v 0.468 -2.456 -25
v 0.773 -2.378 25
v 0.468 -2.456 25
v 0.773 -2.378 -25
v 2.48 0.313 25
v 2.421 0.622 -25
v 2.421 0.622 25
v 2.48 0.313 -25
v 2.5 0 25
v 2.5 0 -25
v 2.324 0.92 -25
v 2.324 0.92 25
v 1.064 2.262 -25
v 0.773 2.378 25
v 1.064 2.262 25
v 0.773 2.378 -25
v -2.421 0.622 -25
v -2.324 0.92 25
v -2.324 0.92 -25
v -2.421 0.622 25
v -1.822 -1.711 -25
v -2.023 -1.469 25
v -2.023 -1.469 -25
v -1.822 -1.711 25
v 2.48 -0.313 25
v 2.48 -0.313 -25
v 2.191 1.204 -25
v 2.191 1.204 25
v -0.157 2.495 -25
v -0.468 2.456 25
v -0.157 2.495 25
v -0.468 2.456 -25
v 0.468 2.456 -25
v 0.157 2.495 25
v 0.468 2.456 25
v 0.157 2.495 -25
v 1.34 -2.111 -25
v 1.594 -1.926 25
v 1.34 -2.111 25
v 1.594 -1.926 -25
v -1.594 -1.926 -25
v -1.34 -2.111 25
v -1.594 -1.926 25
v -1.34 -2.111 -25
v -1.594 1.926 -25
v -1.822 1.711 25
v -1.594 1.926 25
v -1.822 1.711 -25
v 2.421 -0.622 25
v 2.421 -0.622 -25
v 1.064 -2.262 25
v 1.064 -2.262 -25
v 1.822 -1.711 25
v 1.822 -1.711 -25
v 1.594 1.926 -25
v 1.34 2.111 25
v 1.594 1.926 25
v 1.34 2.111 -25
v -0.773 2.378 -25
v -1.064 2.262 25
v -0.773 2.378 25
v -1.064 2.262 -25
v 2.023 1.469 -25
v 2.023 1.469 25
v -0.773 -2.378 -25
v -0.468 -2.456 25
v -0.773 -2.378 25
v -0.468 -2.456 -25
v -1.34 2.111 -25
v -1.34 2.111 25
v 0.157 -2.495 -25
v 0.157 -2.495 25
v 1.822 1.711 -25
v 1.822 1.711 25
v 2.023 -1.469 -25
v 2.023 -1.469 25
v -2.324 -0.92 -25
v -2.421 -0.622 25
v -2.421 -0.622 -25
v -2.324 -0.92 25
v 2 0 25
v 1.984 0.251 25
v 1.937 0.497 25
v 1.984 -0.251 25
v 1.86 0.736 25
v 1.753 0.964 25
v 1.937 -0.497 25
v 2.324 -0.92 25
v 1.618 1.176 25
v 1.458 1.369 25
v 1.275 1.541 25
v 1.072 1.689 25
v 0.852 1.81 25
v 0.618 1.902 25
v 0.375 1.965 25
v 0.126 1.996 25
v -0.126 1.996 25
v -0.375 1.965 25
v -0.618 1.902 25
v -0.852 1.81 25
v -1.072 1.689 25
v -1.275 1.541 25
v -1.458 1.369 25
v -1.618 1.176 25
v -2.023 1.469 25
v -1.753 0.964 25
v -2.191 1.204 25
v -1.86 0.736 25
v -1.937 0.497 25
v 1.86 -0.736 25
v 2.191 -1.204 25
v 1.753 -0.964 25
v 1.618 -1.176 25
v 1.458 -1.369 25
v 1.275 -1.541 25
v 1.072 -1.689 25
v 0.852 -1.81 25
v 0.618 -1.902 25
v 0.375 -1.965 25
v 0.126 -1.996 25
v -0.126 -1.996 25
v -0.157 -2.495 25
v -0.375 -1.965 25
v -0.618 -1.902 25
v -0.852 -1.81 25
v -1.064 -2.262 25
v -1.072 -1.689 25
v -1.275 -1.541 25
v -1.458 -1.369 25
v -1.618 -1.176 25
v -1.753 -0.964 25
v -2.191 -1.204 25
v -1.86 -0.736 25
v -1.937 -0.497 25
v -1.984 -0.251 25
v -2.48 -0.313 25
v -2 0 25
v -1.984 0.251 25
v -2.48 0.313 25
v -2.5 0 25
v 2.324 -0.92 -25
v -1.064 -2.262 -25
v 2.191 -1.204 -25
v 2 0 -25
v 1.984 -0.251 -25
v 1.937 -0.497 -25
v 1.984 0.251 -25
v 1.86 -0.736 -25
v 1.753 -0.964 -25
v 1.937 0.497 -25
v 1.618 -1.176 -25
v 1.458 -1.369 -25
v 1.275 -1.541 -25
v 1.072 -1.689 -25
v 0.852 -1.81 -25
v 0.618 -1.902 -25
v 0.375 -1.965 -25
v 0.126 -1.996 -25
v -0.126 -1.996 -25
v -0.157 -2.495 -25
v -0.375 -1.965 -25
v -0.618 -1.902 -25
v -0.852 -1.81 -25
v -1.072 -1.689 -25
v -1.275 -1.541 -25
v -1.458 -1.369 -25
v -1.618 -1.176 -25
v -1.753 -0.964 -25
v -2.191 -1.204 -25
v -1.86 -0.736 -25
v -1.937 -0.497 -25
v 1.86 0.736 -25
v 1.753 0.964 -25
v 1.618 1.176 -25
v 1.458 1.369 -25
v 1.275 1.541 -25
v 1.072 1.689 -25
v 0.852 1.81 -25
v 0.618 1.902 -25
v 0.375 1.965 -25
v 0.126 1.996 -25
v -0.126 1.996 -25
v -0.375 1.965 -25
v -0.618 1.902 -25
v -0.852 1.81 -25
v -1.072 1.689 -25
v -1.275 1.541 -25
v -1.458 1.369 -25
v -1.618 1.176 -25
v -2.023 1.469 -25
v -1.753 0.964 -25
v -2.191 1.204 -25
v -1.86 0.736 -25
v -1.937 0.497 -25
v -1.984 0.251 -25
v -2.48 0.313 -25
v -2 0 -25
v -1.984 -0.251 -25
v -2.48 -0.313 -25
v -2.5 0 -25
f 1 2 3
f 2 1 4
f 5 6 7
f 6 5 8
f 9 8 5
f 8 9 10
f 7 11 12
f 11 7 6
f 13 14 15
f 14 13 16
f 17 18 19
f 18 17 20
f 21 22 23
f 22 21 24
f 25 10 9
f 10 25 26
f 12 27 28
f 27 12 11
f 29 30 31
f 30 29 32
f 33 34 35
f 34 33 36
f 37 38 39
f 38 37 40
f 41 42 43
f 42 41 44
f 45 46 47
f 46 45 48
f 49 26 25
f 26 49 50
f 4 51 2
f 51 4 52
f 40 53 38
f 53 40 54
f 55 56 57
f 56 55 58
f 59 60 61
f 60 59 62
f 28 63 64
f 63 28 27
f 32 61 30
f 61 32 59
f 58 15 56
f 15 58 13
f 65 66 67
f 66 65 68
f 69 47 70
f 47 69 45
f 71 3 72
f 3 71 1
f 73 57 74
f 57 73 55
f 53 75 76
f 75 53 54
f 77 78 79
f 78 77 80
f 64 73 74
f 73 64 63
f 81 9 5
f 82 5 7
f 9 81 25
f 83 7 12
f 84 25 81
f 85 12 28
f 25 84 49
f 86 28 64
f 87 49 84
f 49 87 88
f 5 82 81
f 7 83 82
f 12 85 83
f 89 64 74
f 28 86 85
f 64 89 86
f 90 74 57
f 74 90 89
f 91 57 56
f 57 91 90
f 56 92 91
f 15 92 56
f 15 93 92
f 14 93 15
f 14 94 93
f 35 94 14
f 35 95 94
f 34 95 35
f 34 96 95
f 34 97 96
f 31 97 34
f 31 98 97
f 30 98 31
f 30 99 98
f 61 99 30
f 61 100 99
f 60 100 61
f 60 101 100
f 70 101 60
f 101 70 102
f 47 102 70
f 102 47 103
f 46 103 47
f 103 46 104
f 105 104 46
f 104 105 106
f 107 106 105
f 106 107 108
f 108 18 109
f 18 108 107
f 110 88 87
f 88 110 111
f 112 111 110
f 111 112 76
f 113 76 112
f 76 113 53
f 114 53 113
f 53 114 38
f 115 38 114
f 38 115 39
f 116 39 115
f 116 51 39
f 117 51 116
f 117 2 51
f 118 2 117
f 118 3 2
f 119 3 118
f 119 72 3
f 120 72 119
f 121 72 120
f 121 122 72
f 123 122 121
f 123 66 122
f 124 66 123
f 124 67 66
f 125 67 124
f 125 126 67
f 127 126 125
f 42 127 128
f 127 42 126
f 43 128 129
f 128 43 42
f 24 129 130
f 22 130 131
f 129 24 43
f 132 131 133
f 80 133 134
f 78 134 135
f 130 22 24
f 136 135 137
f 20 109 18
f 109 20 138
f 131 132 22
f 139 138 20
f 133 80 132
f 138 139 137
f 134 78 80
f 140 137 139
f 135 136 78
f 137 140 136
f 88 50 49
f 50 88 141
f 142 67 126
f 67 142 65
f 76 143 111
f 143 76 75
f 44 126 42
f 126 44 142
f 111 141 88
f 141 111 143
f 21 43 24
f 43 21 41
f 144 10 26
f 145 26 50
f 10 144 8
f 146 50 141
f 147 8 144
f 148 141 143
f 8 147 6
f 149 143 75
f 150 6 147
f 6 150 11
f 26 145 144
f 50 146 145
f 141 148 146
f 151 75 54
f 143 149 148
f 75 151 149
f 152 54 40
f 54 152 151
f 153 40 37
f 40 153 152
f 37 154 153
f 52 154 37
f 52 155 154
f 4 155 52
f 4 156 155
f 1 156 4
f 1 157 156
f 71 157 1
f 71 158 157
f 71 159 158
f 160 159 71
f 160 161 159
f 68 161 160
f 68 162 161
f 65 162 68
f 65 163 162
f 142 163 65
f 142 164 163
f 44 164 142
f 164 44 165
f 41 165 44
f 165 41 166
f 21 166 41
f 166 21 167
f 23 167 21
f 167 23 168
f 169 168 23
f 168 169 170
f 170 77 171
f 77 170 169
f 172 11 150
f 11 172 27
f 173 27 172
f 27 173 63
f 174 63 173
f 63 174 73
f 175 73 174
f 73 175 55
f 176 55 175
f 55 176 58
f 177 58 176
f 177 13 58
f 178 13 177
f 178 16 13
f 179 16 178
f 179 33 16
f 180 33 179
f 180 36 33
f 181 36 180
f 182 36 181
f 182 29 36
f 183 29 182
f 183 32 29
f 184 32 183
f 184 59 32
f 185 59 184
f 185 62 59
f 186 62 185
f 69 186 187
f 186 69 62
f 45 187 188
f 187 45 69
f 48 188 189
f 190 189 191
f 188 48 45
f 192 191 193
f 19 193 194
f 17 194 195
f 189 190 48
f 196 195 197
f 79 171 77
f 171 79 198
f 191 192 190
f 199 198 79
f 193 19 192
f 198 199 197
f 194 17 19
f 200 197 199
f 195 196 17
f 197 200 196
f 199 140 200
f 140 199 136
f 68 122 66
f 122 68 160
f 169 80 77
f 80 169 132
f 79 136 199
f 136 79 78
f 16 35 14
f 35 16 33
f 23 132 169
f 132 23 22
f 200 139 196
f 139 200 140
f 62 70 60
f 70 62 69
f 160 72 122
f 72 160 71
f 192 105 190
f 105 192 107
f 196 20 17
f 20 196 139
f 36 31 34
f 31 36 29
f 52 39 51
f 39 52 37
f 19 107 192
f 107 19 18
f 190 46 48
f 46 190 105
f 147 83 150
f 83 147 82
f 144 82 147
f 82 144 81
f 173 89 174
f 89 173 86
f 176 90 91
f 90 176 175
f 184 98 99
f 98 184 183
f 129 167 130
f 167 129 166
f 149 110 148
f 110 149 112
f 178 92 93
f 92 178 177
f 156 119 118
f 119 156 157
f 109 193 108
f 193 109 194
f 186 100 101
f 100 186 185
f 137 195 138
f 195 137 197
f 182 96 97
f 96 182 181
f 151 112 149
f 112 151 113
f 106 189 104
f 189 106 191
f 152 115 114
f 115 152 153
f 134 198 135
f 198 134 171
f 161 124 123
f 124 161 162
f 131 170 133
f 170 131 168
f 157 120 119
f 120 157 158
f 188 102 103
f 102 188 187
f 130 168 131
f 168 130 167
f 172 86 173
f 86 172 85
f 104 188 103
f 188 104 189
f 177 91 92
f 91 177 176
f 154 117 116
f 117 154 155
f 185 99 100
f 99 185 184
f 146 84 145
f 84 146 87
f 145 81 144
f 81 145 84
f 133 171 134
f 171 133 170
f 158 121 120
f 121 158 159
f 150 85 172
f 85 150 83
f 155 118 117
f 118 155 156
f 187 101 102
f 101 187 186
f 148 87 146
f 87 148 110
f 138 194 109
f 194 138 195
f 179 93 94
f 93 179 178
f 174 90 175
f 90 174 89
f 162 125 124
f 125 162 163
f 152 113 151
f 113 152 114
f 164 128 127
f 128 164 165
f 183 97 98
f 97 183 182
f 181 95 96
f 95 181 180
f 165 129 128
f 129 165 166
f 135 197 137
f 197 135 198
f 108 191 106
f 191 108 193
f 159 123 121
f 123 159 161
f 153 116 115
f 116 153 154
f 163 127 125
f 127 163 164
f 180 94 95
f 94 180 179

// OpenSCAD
$fn = 50;


difference() {
	union() {
		translate(v = [0, 0, -25.0000000000]) {
			cylinder(h = 50, r = 2.5000000000);
		}
	}
	union() {
		translate(v = [0, 0, -100.0000000000]) {
			cylinder(h = 200, r = 2.0000000000);
		}
	}
}
